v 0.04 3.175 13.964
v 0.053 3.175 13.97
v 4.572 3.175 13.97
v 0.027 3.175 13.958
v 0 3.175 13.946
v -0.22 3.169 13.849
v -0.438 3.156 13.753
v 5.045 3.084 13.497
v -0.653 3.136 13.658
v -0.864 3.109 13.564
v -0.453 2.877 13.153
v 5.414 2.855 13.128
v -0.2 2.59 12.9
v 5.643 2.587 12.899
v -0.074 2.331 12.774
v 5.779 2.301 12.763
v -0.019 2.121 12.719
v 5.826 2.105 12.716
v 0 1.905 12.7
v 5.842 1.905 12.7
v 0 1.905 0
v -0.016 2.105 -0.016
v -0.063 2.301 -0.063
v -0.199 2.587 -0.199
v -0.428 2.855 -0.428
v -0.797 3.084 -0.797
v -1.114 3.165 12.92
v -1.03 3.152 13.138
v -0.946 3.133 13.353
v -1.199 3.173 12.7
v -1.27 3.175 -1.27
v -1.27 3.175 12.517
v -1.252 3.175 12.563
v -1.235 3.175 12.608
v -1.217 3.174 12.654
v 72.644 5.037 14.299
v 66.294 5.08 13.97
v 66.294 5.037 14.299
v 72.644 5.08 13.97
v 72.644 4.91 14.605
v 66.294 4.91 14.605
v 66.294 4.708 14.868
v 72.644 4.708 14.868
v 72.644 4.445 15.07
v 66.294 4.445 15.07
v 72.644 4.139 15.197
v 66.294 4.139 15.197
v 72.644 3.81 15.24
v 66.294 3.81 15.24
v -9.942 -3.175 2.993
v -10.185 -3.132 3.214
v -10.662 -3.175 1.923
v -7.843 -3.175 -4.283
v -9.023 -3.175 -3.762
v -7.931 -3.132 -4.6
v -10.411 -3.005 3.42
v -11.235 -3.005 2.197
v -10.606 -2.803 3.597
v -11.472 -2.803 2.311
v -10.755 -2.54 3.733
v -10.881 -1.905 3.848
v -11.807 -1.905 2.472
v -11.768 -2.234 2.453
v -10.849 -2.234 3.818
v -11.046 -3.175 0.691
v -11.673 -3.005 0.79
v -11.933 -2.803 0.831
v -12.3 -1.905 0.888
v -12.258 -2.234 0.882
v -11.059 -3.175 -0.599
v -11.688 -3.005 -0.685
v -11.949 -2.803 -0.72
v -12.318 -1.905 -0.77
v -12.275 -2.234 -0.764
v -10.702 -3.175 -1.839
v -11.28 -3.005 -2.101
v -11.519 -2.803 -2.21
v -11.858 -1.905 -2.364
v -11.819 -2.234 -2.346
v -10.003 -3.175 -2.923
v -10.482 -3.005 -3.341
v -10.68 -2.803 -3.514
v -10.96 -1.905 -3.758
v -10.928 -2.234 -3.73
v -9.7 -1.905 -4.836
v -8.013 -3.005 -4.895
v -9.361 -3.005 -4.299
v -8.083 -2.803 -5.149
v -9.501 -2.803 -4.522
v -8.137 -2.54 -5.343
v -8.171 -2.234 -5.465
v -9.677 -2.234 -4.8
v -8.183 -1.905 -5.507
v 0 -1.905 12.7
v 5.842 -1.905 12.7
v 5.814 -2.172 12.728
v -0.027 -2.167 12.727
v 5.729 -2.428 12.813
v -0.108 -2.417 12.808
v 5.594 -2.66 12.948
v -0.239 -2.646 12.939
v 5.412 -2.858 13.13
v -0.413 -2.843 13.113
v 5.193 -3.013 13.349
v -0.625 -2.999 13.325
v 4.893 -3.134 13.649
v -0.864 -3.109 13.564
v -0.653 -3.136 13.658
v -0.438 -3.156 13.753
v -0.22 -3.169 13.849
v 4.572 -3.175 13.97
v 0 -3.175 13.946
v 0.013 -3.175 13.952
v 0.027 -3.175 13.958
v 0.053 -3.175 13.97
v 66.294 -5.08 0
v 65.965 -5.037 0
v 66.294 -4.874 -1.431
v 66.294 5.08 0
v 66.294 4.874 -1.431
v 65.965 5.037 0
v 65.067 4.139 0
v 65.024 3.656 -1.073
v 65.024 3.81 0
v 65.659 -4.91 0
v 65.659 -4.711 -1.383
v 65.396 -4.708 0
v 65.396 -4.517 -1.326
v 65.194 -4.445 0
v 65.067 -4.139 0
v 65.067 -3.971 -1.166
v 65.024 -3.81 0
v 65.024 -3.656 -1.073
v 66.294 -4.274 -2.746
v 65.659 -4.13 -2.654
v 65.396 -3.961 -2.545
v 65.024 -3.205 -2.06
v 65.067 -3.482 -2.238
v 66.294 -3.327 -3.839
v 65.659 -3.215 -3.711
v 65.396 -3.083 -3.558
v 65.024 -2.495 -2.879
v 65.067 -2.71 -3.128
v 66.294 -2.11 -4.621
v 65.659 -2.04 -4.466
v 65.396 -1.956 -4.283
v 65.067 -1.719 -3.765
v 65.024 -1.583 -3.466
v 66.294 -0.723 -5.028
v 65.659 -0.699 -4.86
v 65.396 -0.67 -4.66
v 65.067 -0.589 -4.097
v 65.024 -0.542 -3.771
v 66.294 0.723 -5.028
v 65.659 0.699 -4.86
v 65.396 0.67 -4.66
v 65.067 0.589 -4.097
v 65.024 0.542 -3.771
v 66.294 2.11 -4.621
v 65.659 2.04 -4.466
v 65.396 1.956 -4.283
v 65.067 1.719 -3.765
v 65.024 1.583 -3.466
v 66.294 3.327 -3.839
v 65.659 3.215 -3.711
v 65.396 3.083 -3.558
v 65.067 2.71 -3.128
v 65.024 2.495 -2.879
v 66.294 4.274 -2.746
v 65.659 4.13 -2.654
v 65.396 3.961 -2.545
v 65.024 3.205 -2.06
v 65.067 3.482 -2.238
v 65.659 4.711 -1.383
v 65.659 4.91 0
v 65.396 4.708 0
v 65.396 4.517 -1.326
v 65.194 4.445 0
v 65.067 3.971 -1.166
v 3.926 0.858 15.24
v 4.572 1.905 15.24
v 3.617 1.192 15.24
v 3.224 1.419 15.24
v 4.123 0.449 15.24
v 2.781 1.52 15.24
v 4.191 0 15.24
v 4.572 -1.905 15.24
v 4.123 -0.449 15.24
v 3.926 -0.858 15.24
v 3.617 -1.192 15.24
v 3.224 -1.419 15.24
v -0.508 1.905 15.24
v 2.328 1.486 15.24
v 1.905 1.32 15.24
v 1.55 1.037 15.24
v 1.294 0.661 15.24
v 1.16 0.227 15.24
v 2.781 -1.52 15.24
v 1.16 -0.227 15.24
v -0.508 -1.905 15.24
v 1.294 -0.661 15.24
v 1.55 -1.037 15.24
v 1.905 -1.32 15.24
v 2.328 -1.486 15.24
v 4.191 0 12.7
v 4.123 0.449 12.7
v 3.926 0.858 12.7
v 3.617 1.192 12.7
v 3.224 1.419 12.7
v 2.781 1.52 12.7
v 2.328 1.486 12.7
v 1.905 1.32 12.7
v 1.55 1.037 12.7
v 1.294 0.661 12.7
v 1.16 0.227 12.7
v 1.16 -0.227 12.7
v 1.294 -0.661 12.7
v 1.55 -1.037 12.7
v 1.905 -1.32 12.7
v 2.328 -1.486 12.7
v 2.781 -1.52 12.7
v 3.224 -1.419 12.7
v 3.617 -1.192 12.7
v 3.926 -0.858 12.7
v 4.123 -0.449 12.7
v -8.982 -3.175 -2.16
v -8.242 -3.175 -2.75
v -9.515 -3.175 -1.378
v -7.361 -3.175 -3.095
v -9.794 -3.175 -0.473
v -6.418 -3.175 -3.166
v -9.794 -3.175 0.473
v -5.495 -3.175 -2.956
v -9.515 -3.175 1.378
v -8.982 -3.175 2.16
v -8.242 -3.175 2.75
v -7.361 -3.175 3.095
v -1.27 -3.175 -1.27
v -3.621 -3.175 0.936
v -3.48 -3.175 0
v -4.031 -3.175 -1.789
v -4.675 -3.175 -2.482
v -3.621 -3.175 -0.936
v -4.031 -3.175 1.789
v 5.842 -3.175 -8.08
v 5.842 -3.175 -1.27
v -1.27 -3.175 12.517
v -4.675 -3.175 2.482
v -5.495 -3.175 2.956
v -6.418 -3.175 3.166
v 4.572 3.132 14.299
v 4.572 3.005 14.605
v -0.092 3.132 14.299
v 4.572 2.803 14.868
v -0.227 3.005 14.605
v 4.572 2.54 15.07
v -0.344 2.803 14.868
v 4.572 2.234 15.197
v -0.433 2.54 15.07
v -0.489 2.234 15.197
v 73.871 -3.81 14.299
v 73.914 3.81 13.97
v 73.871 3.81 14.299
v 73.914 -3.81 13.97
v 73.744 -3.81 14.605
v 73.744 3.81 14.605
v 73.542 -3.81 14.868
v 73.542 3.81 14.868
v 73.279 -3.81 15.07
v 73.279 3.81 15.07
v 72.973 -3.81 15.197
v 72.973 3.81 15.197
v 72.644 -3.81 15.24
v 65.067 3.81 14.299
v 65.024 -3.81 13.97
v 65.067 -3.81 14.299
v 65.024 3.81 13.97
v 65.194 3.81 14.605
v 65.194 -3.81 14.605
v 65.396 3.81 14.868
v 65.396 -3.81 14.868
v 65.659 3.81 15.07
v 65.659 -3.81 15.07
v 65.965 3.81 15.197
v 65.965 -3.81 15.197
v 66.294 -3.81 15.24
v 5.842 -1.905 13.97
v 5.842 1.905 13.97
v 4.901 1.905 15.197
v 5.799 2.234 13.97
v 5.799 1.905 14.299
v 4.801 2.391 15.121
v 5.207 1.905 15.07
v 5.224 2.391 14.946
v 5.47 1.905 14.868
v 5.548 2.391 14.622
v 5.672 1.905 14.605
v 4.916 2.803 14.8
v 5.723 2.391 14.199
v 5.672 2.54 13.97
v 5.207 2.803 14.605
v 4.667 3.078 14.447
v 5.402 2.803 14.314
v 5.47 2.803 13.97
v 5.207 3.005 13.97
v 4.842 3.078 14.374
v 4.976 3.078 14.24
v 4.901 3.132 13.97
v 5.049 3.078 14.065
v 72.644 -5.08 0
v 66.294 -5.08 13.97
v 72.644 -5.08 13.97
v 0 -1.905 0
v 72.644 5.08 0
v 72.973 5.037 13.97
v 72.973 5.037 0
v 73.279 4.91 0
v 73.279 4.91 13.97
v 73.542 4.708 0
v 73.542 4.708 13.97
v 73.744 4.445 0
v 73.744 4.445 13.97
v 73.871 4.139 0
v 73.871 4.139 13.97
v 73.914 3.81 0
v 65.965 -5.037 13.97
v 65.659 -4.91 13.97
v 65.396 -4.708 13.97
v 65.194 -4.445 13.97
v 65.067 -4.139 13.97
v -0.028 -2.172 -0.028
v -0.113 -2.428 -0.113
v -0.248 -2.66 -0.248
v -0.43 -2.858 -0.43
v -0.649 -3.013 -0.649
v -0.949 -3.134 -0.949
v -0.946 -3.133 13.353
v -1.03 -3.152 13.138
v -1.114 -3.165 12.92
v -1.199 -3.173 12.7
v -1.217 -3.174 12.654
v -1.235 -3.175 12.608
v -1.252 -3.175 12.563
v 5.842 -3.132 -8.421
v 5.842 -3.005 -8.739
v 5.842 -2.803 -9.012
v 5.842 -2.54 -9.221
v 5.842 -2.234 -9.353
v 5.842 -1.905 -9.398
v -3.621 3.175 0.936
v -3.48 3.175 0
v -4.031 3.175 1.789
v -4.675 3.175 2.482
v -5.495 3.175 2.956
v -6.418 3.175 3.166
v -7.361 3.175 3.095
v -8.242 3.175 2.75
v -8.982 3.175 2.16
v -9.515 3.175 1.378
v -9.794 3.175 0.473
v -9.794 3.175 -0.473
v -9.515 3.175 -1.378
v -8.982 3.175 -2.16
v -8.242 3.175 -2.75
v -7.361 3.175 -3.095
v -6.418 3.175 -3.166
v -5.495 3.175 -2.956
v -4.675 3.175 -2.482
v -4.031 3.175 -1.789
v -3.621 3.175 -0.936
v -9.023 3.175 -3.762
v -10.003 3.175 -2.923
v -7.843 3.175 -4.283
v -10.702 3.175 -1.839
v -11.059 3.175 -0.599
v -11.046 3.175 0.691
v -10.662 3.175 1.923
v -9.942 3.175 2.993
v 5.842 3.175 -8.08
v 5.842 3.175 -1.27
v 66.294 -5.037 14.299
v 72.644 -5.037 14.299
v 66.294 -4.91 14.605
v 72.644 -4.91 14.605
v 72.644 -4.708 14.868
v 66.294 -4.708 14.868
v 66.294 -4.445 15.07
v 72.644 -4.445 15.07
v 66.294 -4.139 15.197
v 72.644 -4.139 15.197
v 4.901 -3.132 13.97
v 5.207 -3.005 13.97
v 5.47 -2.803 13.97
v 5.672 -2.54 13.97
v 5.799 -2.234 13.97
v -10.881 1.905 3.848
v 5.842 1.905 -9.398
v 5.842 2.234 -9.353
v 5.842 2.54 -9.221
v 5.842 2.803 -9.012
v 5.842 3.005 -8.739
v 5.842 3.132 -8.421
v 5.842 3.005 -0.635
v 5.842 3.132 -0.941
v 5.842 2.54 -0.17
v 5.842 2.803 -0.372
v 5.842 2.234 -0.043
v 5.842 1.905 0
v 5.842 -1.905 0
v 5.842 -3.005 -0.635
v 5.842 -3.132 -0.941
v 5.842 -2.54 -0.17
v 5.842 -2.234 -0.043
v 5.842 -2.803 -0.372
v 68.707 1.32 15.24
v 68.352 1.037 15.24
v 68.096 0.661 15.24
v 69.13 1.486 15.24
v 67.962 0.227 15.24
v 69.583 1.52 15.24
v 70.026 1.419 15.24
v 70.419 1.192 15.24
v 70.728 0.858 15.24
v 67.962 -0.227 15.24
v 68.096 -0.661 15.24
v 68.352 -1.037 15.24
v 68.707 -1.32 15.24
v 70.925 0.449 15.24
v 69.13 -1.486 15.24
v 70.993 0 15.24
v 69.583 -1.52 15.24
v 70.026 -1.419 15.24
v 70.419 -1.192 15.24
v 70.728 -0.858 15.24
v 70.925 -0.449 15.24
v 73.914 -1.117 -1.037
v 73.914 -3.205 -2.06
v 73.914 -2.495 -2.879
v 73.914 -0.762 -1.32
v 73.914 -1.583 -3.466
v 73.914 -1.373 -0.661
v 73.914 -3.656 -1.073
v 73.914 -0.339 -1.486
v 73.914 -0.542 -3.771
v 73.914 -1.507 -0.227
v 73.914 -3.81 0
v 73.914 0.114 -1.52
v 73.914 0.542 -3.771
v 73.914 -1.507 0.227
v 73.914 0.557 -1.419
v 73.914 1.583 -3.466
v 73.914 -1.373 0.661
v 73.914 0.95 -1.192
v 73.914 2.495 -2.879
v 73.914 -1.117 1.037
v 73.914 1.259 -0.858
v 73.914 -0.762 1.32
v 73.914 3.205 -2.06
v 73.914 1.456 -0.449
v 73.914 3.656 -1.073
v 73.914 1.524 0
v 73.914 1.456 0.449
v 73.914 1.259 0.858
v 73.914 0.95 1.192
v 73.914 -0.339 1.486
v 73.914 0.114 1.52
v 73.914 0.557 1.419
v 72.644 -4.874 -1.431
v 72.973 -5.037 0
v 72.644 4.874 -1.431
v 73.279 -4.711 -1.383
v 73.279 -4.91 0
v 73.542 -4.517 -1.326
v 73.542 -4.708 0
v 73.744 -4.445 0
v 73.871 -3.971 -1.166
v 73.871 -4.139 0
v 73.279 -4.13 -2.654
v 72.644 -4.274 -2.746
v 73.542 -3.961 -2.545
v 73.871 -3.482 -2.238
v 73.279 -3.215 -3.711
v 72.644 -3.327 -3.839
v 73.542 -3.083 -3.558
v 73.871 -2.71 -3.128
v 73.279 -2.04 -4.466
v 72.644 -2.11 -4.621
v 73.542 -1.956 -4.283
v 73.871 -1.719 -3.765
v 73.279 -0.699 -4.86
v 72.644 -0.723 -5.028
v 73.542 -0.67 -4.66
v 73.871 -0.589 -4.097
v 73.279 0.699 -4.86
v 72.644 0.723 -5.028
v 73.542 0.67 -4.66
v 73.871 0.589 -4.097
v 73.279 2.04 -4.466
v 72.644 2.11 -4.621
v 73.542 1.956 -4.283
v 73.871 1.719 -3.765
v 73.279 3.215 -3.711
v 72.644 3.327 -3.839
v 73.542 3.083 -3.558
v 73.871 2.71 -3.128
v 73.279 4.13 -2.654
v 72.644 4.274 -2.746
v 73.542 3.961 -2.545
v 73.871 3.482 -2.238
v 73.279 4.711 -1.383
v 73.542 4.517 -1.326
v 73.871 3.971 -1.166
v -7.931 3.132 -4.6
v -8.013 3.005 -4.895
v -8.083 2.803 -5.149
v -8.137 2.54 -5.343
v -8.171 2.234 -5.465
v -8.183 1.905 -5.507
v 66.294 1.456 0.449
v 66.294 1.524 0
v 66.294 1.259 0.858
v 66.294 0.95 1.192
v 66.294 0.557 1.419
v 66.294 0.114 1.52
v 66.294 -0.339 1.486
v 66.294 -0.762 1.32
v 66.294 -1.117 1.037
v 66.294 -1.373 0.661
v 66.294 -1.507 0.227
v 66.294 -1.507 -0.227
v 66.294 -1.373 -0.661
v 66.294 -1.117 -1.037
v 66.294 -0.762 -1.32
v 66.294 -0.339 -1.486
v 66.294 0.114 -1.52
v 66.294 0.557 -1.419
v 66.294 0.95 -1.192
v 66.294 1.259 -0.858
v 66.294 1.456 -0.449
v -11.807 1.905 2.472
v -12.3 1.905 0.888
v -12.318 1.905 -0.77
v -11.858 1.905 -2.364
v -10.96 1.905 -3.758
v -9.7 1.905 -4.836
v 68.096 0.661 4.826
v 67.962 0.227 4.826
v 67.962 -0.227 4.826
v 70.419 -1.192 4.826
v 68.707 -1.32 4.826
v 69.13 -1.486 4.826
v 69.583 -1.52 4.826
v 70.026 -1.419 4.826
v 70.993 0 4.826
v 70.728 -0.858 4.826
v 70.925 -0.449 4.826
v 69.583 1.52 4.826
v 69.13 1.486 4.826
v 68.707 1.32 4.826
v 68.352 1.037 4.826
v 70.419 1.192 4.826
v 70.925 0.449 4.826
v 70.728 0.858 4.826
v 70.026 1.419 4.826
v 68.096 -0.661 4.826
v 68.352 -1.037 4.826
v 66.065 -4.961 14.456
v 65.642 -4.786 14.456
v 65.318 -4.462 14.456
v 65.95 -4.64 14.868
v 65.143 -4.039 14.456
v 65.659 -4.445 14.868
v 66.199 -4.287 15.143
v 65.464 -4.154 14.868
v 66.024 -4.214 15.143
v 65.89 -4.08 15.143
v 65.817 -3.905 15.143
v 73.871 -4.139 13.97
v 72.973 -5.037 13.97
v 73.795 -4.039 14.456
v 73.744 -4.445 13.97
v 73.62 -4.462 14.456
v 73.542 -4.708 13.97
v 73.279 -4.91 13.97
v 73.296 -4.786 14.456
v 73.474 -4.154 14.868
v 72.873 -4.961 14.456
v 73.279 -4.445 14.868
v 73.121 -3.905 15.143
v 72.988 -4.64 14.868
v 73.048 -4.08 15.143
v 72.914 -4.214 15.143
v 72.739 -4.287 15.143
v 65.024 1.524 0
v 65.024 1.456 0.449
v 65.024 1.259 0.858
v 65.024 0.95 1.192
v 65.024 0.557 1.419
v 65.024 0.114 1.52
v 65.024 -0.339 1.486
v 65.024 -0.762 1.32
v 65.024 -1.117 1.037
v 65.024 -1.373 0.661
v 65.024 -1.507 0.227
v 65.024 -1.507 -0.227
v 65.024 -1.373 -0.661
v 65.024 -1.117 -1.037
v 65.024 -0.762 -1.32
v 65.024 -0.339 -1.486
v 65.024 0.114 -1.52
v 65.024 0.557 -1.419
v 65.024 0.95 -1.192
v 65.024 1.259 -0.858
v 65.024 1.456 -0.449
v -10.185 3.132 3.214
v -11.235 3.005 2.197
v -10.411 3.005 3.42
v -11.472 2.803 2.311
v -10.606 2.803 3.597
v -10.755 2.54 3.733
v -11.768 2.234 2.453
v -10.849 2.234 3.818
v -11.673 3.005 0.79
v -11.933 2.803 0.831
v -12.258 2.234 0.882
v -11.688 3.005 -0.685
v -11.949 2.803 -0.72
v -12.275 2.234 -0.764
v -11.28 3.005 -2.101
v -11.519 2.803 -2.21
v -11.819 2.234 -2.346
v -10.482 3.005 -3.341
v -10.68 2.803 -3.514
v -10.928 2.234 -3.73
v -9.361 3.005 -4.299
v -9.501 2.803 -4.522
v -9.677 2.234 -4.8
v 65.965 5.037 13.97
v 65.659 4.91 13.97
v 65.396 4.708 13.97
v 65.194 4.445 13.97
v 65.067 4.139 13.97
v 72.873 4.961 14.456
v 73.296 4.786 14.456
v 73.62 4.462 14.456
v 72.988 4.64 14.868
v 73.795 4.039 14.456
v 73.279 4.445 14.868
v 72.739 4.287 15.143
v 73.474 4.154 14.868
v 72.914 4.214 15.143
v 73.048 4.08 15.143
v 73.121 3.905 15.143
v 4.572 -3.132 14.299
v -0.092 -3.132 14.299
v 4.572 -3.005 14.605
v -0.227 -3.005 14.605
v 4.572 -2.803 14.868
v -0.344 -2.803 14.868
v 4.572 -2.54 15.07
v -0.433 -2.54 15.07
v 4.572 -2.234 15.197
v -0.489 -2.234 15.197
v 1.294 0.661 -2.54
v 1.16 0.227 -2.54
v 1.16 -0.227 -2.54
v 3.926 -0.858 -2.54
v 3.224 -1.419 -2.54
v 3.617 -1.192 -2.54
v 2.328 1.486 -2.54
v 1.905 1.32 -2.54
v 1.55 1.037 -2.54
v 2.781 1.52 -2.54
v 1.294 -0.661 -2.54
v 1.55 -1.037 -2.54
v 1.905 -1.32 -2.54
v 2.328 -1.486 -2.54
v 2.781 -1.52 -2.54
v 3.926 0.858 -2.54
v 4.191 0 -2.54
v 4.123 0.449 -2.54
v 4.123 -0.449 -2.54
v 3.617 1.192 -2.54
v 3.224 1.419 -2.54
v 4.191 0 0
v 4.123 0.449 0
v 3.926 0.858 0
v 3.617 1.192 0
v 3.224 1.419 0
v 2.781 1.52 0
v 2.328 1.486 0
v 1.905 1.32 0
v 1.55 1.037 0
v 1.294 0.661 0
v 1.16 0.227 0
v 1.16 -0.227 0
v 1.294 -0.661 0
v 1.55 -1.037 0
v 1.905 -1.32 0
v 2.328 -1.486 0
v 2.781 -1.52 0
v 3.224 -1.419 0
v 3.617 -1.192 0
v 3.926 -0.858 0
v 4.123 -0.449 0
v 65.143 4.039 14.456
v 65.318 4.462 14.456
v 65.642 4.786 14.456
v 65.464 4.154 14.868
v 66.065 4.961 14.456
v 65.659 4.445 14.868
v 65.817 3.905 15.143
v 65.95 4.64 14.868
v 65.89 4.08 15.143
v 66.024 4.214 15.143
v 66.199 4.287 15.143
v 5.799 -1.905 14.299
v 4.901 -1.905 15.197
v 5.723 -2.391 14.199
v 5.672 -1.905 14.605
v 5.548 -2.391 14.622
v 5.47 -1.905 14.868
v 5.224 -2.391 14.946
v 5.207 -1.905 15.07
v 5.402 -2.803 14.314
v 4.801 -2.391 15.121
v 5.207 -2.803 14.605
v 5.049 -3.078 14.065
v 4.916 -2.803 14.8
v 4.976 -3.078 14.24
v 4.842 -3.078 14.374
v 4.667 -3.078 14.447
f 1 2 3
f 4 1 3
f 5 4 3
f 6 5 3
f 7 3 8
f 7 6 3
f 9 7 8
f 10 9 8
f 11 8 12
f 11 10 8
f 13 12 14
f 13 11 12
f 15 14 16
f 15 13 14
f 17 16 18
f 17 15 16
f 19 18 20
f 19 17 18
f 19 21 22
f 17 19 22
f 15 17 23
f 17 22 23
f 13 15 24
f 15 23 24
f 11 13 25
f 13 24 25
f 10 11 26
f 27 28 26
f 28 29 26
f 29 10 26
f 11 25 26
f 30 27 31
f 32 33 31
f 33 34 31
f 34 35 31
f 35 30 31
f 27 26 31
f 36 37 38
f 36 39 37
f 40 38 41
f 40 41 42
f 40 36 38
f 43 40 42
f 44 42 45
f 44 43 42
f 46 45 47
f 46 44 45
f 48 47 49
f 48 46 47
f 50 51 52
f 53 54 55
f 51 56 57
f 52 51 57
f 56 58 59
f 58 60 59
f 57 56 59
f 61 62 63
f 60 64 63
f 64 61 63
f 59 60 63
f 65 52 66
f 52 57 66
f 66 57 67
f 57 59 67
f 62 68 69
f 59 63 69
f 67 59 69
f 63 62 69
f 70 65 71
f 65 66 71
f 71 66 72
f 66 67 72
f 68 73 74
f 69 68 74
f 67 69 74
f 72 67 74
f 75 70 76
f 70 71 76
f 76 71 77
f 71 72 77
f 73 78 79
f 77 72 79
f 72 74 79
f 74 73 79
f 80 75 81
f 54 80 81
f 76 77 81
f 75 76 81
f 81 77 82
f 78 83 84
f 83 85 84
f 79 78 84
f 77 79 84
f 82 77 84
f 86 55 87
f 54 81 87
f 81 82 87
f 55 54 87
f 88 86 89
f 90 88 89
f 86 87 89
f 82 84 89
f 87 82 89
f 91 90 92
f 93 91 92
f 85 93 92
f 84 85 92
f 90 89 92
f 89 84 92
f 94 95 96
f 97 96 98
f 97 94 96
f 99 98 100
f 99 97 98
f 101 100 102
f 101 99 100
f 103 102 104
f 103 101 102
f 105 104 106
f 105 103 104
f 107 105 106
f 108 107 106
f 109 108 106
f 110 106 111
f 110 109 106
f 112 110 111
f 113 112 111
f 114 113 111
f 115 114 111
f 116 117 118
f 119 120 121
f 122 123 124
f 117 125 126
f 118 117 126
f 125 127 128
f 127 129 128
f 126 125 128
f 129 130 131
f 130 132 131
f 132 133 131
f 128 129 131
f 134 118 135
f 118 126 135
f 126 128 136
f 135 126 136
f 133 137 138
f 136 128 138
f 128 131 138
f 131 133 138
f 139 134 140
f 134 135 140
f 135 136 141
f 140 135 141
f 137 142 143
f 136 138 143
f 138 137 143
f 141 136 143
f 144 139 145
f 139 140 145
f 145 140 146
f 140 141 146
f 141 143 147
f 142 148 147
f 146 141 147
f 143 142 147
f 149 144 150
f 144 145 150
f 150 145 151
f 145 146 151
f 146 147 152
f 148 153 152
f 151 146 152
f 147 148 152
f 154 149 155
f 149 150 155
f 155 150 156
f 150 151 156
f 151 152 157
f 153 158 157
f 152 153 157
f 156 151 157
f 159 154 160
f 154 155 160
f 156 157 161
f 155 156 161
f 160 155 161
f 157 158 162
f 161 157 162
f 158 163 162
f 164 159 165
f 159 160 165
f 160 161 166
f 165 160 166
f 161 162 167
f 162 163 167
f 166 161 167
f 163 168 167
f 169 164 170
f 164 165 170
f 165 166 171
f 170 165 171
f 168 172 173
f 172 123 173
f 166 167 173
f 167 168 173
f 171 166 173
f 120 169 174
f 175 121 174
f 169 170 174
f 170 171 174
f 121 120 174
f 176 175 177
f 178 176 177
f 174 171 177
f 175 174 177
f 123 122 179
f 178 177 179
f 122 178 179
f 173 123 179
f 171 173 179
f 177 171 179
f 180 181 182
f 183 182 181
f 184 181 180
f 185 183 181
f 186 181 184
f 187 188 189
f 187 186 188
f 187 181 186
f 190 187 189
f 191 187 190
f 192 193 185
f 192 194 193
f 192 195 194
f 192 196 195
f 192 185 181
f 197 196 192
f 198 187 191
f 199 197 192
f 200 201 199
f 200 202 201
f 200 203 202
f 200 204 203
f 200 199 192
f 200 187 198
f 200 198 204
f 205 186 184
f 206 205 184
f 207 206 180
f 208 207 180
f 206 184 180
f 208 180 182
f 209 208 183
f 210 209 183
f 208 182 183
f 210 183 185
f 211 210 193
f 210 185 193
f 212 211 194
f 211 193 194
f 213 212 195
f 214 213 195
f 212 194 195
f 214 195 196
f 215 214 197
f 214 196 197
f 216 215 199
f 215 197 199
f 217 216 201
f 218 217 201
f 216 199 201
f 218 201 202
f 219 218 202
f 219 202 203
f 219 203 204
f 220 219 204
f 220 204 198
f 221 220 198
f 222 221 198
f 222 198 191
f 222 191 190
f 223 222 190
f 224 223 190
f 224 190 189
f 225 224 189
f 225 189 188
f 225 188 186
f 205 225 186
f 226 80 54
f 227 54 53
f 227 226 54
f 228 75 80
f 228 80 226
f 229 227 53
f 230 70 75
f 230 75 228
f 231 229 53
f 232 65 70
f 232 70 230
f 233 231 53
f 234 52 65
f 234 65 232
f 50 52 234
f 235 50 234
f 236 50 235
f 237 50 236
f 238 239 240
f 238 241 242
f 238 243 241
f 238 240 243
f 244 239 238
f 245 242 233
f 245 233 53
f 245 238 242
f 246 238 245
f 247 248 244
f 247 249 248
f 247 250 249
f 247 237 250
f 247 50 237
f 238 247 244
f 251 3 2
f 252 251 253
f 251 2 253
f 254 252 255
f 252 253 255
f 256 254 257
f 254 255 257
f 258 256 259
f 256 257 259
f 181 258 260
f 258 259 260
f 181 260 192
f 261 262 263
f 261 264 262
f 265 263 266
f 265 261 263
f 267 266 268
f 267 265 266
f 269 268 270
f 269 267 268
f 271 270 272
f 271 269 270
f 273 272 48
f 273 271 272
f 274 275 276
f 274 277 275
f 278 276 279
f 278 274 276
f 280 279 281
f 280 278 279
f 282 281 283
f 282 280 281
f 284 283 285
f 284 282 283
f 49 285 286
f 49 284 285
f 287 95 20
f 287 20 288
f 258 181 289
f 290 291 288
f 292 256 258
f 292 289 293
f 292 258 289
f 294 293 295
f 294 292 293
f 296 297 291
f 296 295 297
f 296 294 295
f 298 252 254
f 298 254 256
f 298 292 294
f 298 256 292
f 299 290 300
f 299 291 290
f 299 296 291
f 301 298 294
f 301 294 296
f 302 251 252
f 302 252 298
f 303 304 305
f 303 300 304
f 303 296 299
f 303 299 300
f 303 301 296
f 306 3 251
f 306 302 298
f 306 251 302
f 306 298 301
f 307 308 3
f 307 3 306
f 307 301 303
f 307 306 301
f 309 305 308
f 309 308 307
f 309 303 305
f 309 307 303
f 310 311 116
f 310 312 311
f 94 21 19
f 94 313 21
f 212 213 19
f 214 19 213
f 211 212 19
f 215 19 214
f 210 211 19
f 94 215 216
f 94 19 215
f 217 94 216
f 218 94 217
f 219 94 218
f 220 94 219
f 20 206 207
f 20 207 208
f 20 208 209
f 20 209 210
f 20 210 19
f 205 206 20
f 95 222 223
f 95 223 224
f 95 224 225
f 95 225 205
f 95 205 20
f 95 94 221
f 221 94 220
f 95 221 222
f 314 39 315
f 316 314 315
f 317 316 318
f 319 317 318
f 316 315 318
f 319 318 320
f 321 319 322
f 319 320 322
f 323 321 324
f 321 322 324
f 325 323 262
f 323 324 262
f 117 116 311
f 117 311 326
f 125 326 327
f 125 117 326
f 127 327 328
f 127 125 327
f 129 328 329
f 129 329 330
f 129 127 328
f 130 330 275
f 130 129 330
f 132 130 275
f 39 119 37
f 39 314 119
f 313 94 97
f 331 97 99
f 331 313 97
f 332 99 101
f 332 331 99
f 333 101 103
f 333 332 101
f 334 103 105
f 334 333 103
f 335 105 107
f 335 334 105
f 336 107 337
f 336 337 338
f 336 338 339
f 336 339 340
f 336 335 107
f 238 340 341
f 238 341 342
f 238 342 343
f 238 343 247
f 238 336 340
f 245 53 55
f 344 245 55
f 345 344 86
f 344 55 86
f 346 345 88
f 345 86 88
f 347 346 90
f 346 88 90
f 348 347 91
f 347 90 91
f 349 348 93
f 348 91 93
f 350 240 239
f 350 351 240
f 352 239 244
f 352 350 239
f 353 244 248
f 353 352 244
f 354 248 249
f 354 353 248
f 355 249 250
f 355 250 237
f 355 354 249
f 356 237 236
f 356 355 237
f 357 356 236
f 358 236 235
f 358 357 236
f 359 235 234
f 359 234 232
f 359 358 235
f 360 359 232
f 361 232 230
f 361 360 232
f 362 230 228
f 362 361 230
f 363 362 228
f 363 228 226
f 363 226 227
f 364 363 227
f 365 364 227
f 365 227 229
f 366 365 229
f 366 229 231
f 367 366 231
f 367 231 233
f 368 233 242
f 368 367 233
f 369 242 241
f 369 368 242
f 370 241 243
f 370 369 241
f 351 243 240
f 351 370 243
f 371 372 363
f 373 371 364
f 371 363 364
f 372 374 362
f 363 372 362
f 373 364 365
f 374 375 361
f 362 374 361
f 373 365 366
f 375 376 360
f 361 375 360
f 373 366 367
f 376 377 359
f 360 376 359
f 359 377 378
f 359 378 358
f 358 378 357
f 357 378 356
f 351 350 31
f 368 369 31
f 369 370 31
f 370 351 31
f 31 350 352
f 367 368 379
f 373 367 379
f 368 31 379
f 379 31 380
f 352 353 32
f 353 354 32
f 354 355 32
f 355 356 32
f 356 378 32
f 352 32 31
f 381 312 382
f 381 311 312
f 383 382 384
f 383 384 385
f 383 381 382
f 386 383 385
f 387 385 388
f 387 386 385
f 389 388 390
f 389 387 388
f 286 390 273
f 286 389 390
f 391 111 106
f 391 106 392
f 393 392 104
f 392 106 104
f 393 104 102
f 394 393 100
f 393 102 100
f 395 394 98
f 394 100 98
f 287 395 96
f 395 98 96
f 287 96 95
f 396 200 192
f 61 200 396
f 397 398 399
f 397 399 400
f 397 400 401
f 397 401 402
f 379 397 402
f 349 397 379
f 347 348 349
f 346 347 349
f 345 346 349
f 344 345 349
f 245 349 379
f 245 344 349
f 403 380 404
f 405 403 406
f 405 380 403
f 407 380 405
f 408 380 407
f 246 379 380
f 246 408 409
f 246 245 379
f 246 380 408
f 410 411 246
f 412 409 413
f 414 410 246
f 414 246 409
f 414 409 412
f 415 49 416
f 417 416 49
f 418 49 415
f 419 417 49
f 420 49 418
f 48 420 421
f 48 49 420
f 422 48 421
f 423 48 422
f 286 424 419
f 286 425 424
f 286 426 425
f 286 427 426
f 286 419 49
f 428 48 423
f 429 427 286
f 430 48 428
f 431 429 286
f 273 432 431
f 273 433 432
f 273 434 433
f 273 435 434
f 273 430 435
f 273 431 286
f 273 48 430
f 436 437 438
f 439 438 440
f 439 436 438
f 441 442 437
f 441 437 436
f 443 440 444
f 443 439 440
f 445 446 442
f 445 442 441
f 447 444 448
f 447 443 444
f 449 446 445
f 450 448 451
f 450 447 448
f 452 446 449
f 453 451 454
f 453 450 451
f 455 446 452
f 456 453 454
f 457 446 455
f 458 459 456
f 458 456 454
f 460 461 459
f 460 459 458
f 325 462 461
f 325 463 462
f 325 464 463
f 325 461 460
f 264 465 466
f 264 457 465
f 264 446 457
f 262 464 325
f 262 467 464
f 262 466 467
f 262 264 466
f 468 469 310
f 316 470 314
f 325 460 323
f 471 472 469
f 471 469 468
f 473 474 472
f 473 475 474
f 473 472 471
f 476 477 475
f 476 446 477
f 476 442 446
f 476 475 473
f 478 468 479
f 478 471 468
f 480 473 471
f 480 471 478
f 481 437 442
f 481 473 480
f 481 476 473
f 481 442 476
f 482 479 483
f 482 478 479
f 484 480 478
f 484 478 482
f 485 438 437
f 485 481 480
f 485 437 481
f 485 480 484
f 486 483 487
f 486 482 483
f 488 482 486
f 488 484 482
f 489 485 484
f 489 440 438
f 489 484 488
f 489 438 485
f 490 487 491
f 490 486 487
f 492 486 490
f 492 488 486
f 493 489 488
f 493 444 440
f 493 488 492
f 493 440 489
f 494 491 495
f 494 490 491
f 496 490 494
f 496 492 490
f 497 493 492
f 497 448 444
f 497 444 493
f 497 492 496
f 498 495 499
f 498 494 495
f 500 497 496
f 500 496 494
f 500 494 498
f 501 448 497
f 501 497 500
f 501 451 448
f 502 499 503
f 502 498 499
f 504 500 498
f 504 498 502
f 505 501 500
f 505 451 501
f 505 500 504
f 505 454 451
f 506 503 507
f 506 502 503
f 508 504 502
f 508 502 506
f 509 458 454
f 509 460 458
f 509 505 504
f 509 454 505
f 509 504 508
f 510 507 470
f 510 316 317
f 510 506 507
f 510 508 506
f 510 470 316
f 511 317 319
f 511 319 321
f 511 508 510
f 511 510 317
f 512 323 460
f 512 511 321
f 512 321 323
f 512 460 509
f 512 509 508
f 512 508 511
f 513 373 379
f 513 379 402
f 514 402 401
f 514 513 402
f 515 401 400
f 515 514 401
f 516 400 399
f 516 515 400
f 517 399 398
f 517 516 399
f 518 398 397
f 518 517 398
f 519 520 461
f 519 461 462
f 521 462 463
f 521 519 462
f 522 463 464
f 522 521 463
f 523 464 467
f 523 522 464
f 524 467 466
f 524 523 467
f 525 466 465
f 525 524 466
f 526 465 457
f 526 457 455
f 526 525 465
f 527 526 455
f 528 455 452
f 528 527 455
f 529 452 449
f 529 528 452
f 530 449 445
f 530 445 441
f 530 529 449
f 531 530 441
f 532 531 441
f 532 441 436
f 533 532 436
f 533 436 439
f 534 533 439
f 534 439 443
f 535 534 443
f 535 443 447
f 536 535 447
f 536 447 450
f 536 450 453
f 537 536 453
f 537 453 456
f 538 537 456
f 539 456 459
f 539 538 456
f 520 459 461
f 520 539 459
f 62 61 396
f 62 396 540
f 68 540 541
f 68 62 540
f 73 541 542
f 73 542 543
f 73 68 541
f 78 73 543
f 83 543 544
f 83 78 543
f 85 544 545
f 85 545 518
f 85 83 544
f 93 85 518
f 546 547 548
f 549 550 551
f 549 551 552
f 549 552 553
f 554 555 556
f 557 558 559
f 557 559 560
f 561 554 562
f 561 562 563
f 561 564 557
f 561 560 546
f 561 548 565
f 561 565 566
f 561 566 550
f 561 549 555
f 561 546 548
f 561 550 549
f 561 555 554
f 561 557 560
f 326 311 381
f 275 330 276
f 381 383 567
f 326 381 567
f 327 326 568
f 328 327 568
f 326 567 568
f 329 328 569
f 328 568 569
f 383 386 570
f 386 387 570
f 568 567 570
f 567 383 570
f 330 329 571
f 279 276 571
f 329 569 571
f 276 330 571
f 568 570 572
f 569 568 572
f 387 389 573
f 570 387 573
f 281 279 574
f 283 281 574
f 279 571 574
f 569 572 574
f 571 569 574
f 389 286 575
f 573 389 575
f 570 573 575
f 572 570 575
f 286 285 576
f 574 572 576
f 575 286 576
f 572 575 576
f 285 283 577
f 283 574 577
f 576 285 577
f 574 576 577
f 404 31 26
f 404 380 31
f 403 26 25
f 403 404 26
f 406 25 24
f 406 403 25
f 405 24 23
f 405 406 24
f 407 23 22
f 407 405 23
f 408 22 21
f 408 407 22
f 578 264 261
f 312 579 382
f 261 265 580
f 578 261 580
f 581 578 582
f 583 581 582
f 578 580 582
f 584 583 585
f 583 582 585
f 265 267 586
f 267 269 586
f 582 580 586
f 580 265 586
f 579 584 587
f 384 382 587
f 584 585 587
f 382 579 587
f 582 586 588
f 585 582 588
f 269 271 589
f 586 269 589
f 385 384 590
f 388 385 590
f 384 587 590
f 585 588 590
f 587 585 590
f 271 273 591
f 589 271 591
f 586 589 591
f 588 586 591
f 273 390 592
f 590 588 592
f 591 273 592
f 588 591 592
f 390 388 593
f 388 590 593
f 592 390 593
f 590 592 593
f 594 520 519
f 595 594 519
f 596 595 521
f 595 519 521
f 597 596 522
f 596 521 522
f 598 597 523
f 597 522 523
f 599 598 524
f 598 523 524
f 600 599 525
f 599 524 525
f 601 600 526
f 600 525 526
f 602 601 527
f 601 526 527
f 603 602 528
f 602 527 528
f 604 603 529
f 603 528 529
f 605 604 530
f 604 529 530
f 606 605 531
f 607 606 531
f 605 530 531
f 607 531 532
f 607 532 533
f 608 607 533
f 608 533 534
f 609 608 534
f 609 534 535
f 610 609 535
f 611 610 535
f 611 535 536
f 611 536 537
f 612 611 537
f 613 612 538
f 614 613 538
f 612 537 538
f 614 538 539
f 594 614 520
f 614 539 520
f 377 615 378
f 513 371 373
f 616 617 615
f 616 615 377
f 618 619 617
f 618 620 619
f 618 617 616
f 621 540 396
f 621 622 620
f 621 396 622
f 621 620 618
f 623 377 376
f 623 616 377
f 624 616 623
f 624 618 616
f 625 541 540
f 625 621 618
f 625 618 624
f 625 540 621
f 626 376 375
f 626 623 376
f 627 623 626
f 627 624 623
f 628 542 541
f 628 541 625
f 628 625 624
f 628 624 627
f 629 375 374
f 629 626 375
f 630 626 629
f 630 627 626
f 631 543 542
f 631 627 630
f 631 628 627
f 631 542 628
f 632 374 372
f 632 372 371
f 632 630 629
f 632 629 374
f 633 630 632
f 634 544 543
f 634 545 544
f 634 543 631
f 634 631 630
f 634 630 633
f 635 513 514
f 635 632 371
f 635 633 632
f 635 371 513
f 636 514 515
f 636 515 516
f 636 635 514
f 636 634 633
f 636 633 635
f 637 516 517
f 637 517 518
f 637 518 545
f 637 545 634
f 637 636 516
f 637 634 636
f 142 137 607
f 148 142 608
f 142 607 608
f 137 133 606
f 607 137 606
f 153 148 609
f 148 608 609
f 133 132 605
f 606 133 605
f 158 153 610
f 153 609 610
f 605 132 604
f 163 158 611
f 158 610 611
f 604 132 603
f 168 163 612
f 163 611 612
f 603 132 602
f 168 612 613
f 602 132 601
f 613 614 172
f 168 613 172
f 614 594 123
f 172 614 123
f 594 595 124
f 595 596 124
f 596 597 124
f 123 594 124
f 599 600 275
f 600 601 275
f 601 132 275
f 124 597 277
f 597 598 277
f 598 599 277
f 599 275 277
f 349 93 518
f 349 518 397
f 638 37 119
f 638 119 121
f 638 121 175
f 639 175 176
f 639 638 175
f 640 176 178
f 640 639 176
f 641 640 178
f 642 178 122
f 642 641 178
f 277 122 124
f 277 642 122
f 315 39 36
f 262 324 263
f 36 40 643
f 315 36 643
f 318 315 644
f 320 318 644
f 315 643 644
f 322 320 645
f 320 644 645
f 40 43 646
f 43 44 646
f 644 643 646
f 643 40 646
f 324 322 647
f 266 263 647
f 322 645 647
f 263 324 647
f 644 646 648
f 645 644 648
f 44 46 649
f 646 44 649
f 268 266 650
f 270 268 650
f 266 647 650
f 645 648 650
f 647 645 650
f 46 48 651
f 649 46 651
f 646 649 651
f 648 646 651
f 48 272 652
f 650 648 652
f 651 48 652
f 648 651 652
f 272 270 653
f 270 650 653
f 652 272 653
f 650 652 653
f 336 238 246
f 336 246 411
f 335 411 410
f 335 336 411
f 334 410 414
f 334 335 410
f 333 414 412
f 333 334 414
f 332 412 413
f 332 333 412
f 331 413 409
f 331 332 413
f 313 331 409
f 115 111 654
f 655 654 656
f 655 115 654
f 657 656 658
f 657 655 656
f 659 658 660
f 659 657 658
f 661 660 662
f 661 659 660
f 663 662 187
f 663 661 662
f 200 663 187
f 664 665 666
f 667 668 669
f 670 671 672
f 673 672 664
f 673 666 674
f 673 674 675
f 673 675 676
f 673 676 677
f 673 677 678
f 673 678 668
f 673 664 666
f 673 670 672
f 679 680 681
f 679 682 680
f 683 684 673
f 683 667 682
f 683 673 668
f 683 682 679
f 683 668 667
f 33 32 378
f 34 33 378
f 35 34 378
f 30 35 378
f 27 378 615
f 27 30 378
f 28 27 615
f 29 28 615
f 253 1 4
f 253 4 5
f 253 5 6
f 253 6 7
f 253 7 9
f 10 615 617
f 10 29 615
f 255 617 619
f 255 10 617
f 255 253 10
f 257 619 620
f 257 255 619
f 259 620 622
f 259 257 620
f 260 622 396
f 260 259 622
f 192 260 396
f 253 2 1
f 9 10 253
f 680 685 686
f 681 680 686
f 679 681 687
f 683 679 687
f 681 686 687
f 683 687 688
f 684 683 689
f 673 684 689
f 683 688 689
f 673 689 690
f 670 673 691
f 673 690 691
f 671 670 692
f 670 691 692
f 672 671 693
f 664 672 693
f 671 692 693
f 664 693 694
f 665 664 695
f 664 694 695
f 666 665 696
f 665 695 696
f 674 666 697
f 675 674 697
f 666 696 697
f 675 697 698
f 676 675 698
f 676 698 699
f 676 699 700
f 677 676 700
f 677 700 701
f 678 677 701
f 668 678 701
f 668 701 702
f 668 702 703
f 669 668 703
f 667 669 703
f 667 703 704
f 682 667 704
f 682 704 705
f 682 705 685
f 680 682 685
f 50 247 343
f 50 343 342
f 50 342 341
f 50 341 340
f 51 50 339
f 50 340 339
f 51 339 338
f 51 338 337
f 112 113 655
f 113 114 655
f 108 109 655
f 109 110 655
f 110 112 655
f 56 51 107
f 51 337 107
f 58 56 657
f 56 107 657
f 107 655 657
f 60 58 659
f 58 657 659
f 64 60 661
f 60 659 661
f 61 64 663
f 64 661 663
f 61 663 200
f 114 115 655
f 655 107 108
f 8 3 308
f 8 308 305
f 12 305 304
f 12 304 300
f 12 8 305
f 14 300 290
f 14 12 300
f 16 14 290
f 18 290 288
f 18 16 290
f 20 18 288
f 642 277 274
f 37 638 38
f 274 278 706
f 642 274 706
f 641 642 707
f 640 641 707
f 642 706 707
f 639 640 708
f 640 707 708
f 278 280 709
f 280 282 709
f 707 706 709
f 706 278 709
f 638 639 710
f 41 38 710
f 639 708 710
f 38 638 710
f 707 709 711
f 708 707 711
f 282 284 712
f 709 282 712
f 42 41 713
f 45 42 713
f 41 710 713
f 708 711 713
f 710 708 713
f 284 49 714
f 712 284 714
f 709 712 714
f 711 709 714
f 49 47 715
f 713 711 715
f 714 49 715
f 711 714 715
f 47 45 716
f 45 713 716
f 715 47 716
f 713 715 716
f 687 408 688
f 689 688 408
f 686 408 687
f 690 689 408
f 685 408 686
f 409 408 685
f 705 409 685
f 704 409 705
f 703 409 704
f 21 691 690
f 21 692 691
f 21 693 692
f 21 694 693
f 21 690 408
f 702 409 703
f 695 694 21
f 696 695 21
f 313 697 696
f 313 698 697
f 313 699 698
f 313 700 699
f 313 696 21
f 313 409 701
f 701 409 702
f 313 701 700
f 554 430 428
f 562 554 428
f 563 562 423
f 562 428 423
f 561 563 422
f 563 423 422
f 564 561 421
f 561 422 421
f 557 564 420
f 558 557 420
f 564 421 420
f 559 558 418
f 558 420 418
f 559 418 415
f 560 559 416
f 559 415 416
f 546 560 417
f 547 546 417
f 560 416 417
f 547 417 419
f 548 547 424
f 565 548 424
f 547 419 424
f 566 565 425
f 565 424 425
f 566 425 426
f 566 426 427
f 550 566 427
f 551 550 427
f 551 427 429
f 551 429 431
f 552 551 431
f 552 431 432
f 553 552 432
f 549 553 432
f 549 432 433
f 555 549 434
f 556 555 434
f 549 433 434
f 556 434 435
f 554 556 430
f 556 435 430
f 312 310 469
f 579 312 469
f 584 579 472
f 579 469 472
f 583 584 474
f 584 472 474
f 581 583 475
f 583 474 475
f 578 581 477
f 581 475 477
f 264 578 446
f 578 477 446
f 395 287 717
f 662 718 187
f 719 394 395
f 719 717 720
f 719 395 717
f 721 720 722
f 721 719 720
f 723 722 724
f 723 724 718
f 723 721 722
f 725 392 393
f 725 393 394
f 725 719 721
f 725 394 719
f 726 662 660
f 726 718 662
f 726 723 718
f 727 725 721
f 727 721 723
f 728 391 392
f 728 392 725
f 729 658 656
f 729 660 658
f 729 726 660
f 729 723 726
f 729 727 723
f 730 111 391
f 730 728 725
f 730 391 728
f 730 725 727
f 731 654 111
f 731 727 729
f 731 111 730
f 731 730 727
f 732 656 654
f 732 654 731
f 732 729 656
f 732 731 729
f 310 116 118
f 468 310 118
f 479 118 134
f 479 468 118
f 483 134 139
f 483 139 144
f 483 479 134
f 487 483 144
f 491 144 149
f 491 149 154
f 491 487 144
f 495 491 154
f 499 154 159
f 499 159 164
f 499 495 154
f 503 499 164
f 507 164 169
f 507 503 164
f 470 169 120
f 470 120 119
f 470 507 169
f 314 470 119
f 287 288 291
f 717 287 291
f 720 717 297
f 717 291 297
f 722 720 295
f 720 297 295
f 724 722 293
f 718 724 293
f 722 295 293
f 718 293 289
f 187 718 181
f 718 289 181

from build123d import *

# Parameters (mm, degrees)
F0_R          = 3.175
F2_DEPTH      = 3.175
F3_R          = 1.524
F4_DEPTH      = 7.62
F4_DEPTH_BACK = 1.27
F5_DEPTH      = 56.134
F7_R          = 1.524
F8_DEPTH      = 17.78
F6_R          = 1.524
F9_DEPTH      = 10.414
F10_T1_DEPTH  = 18.5821257943
F10_T3_DEPTH  = 8.255
F10_T5_DEPTH  = 4.445
F10_T7_DEPTH  = 9.017
F10_T9_DEPTH  = 12.7
F10_T11_DEPTH = 17.7294216388
F10_T13_DEPTH = 3.81
F10_S17_W     = 1.27
F10_S17_H     = 1.27
F10_T18_DEPTH = 1.27
F10_S23_W     = 1.27
F10_S23_H     = 1.27
F10_T24_DEPTH = 1.27
F10_T28_ANGLE = 116.8111069241
F10_T30_ANGLE = 116.8111069241
F10_T35_DEPTH = 15.875
F10_T39_DEPTH = 12.192
F10_T46_DEPTH = 15.875
F10_T50_DEPTH = 12.192
F10_T57_DEPTH = 15.875
F10_T61_DEPTH = 12.192
F10_T68_DEPTH = 15.875
F10_T72_DEPTH = 12.192
F10_2_F1_R    = 1.27
F10_2_F2_R    = 1.27
F10_2_F3_R    = 1.27


# Not quite as in the source:
# - a fillet or chamfer that OpenCascade refuses, or shapes differently, is made with other operations: its cross-section is extruded or revolved along the edge and cut away or added
# - two fillets or chamfers of one size are made in one step
# - the program builds the solid bodies; features that only make, move or delete a surface that nothing else refers to are left out


with BuildPart() as f2:
    # F0 (on Front) → F2 (new body, symmetric)
    with BuildSketch(Plane.XZ):
        with BuildLine():
            Line((-0.9398, 0), (0, 0))
            Line((0, 0), (0, 12.7))
            Line((0, 12.7), (5.842, 12.7))
            Line((5.842, 12.7), (5.842, 15.24))
            Line((5.842, 15.24), (-0.508, 15.24))
            Line((-0.508, 15.24), (-10.8806298187, 3.8475430269))
            ThreePointArc((-10.8806298187, 3.8475430269), (-4.5919612295, 5.3297205562), (-0.9398, 0))
        make_face()
        with BuildLine():
            ThreePointArc((-8.1826630726, -5.5069827884), (-3.1957909266, -4.5493385486), (-0.9398, 0))
            ThreePointArc((-0.9398, 0), (-4.5919612295, 5.3297205562), (-10.8806298187, 3.8475430269))
            ThreePointArc((-10.8806298187, 3.8475430269), (-12.1459778134, -1.5837270034), (-8.1826630726, -5.5069827884))
        make_face()
        with Locations((-6.6548, 0)):
            Circle(F0_R, mode=Mode.SUBTRACT)
        with BuildLine():
            Line((5.842, 0), (0, 0))
            Line((0, 0), (-0.9398, 0))
            ThreePointArc((-0.9398, 0), (-3.1957909266, -4.5493385486), (-8.1826630726, -5.5069827884))
            Line((-8.1826630726, -5.5069827884), (5.842, -9.398))
            Line((5.842, -9.398), (5.842, 0))
        make_face()
    extrude(amount=F2_DEPTH, both=True)

    # F3 (on face) → F5 (cut)
    with BuildSketch(Plane.YZ.offset(66.294)):
        Circle(F3_R)
    extrude(amount=-F5_DEPTH, mode=Mode.SUBTRACT)

    # F7 (on face) → F8 (cut)
    with BuildSketch(Plane.XY.offset(15.24)):
        with Locations((2.667, 0)):
            Circle(F7_R)
    extrude(amount=-F8_DEPTH, mode=Mode.SUBTRACT)

    # F10: fillet of radius 1.27 on 17 edges, made by hand

    # F10_s2 → F10_t1 (cut)
    with BuildSketch(Plane(origin=(9.4938886236, 0, 10.4273187748), x_dir=(0, 1, 0), z_dir=(-0.6732358752, 0, -0.7394277898))):
        with BuildLine():
            ThreePointArc((-3.175, -9.3657440555), (-2.8030256121, -10.2637696676), (-1.905, -10.6357440555))
            Line((-1.905, -10.6357440555), (-3.175, -10.6357440555))
            Line((-3.175, -10.6357440555), (-3.175, -9.3657440555))
        make_face()
        with BuildLine():
            ThreePointArc((3.175, -9.3657440555), (2.8030256121, -10.2637696676), (1.905, -10.6357440555))
            Line((1.905, -10.6357440555), (3.175, -10.6357440555))
            Line((3.175, -10.6357440555), (3.175, -9.3657440555))
        make_face()
    extrude(amount=F10_T1_DEPTH, mode=Mode.SUBTRACT)

    # F10_s4 → F10_t3 (cut)
    with BuildSketch(Plane.YZ.offset(-3.683)):
        with BuildLine():
            ThreePointArc((-3.175, 13.97), (-2.8030256121, 14.8680256121), (-1.905, 15.24))
            Line((-1.905, 15.24), (-3.175, 15.24))
            Line((-3.175, 15.24), (-3.175, 13.97))
        make_face()
        with BuildLine():
            ThreePointArc((3.175, 13.97), (2.8030256121, 14.8680256121), (1.905, 15.24))
            Line((1.905, 15.24), (3.175, 15.24))
            Line((3.175, 15.24), (3.175, 13.97))
        make_face()
    extrude(amount=F10_T3_DEPTH, mode=Mode.SUBTRACT)

    # F10_s6 → F10_t5 (cut)
    with BuildSketch(Plane.XY.offset(9.525)):
        with BuildLine():
            ThreePointArc((4.572, -3.175), (5.4700256121, -2.8030256121), (5.842, -1.905))
            Line((5.842, -1.905), (5.842, -3.175))
            Line((5.842, -3.175), (4.572, -3.175))
        make_face()
        with BuildLine():
            ThreePointArc((4.572, 3.175), (5.4700256121, 2.8030256121), (5.842, 1.905))
            Line((5.842, 1.905), (5.842, 3.175))
            Line((5.842, 3.175), (4.572, 3.175))
        make_face()
    extrude(amount=F10_T5_DEPTH, mode=Mode.SUBTRACT)

    # F10_s8 → F10_t7 (cut)
    with BuildSketch(Plane.YZ):
        with BuildLine():
            ThreePointArc((-1.905, 12.7), (-2.8030256121, 13.0719743879), (-3.175, 13.97))
            Line((-3.175, 13.97), (-3.175, 12.7))
            Line((-3.175, 12.7), (-1.905, 12.7))
        make_face()
        with BuildLine():
            ThreePointArc((3.175, 13.97), (2.8030256121, 13.0719743879), (1.905, 12.7))
            Line((1.905, 12.7), (3.175, 12.7))
            Line((3.175, 12.7), (3.175, 13.97))
        make_face()
        with BuildLine():
            ThreePointArc((3.175, -1.27), (2.8030256121, -0.3719743879), (1.905, 0))
            Line((1.905, 0), (3.175, 0))
            Line((3.175, 0), (3.175, -1.27))
        make_face()
        with BuildLine():
            ThreePointArc((-3.175, -1.27), (-2.8030256121, -0.3719743879), (-1.905, 0))
            Line((-1.905, 0), (-3.175, 0))
            Line((-3.175, 0), (-3.175, -1.27))
        make_face()
    extrude(amount=F10_T7_DEPTH, mode=Mode.SUBTRACT)

    # F10_s10 → F10_t9 (cut)
    with BuildSketch(Plane.XY):
        with BuildLine():
            ThreePointArc((0, -1.905), (-0.3719743879, -2.8030256121), (-1.27, -3.175))
            Line((-1.27, -3.175), (0, -3.175))
            Line((0, -3.175), (0, -1.905))
        make_face()
        with BuildLine():
            ThreePointArc((0, 1.905), (-0.3719743879, 2.8030256121), (-1.27, 3.175))
            Line((-1.27, 3.175), (0, 3.175))
            Line((0, 3.175), (0, 1.905))
        make_face()
    extrude(amount=F10_T9_DEPTH, mode=Mode.SUBTRACT)

    # F10_s12 → F10_t11 (cut)
    with BuildSketch(Plane(origin=(-6.179167626, 0, 1.7143547379), x_dir=(0, 1, 0), z_dir=(0.9636015378, 0, -0.2673426199))):
        with BuildLine():
            ThreePointArc((-3.175, -6.2241116667), (-2.8030256121, -7.1221372788), (-1.905, -7.4941116667))
            Line((-1.905, -7.4941116667), (-3.175, -7.4941116667))
            Line((-3.175, -7.4941116667), (-3.175, -6.2241116667))
        make_face()
        with BuildLine():
            ThreePointArc((3.175, -6.2241116667), (2.8030256121, -7.1221372788), (1.905, -7.4941116667))
            Line((1.905, -7.4941116667), (3.175, -7.4941116667))
            Line((3.175, -7.4941116667), (3.175, -6.2241116667))
        make_face()
    extrude(amount=F10_T11_DEPTH, mode=Mode.SUBTRACT)

    # F10_s14 → F10_t13 (cut)
    with BuildSketch(Plane.XZ.offset(-1.905)):
        with BuildLine():
            ThreePointArc((5.842, 13.97), (5.4700256121, 14.8680256121), (4.572, 15.24))
            Line((4.572, 15.24), (5.842, 15.24))
            Line((5.842, 15.24), (5.842, 13.97))
        make_face()
    extrude(amount=F10_T13_DEPTH, mode=Mode.SUBTRACT)


with BuildPart() as f4:
    # F3 (on face) → F4 (new body, two sides)
    with BuildSketch(Plane.YZ.offset(66.294)) as f4_sk:
        with BuildLine():
            ThreePointArc((-5.08, 0), (0, -5.08), (5.08, 0))
            ThreePointArc((5.08, 0), (0, 5.08), (-5.08, 0))
        make_face()
        Circle(F3_R, mode=Mode.SUBTRACT)
        with BuildLine():
            ThreePointArc((-5.08, 0), (0, 5.08), (5.08, 0))
            Line((5.08, 0), (5.08, 15.24))
            Line((5.08, 15.24), (-5.08, 15.24))
            Line((-5.08, 15.24), (-5.08, 0))
        make_face()
    extrude(amount=F4_DEPTH)
    extrude(f4_sk.sketch, amount=-F4_DEPTH_BACK)

    # F6 (on face) → F9 (cut)
    with BuildSketch(Plane.XY.offset(15.24)):
        with Locations((69.469, 0)):
            Circle(F6_R)
    extrude(amount=-F9_DEPTH, mode=Mode.SUBTRACT)

    # F10#2: fillet of radius 1.27 on 10 edges, made by hand

    # F10_2_f1
    f10_2_f1_edges = [f4.edges().sort_by_distance(p)[0] for p in [
        (73.914, 0, -5.08),
        (73.914, -5.08, 7.62),
        (73.914, 5.08, 7.62),
    ]]
    fillet(f10_2_f1_edges, radius=F10_2_F1_R)

    # F10_2_f2
    f10_2_f2_edges = [f4.edges().sort_by_distance(p)[0] for p in [
        (65.024, 0, -5.08),
        (65.024, -5.08, 7.62),
        (65.024, 5.08, 7.62),
    ]]
    fillet(f10_2_f2_edges, radius=F10_2_F2_R)

    # F10_2_f3
    f10_2_f3_edges = [f4.edges().sort_by_distance(p)[0] for p in [
        (69.469, -5.08, 15.24),
    ]]
    fillet(f10_2_f3_edges, radius=F10_2_F3_R)


with BuildPart() as f10_tool16:
    # F10_s17 → F10_t18 (new body)
    with BuildSketch(Plane.XZ.offset(1.905)):
        with Locations((5.207, 14.605)):
            Rectangle(F10_S17_W, F10_S17_H)
    extrude(amount=F10_T18_DEPTH)

    # F10_s19 → F10_t20 (revolve, cut)
    with BuildSketch(Plane(origin=(4.572, -1.905, 13.97), x_dir=(-0.7071067812, 0, -0.7071067812), z_dir=(-0.7071067812, 0, 0.7071067812))):
        with BuildLine():
            ThreePointArc((0, -1.27), (1.27, 0), (0, 1.27))
            Line((0, 1.27), (0, -1.27))
        make_face()
    revolve(axis=Axis((4.572, -1.905, 13.97), (0, -1, 0)), mode=Mode.SUBTRACT)


with BuildPart() as f2_1:
    add(f2.part)

    # F10_t15: cut F10_tool16
    add(f10_tool16.part, mode=Mode.SUBTRACT)


with BuildPart() as f10_tool22:
    # F10_s23 → F10_t24 (new body)
    with BuildSketch(Plane.XZ.offset(-1.905)):
        with Locations((5.207, 14.605)):
            Rectangle(F10_S23_W, F10_S23_H)
    extrude(amount=-F10_T24_DEPTH)

    # F10_s25 → F10_t26 (revolve, cut)
    with BuildSketch(Plane(origin=(4.572, 1.905, 13.97), x_dir=(-0.7071067812, 0, -0.7071067812), z_dir=(0.7071067812, 0, -0.7071067812))):
        with BuildLine():
            ThreePointArc((0, -1.27), (1.27, 0), (0, 1.27))
            Line((0, 1.27), (0, -1.27))
        make_face()
    revolve(axis=Axis((4.572, 1.905, 13.97), (0, 1, 0)), mode=Mode.SUBTRACT)


with BuildPart() as f2_2:
    add(f2_1.part)

    # F10_t21: cut F10_tool22
    add(f10_tool22.part, mode=Mode.SUBTRACT)

    # F10_s27 → F10_t28 (revolve, cut)
    with BuildSketch(Plane(origin=(-3.0162650989, 0, -3.3128214309), x_dir=(0, 1, 0), z_dir=(0.6732358752, 0, 0.7394277898))):
        with BuildLine():
            ThreePointArc((-3.175, 9.3657440555), (-2.8030256121, 10.2637696676), (-1.905, 10.6357440555))
            Line((-1.905, 10.6357440555), (-3.175, 10.6357440555))
            Line((-3.175, 10.6357440555), (-3.175, 9.3657440555))
        make_face()
    revolve(axis=Axis((-6.6548, -3.175, 0), (0, -1, 0)), revolution_arc=F10_T28_ANGLE, mode=Mode.SUBTRACT)

    # F10_s29 → F10_t30 (revolve, cut)
    with BuildSketch(Plane(origin=(-3.0162650989, 0, -3.3128214309), x_dir=(0, 1, 0), z_dir=(0.6732358752, 0, 0.7394277898))):
        with BuildLine():
            ThreePointArc((3.175, 9.3657440555), (2.8030256121, 10.2637696676), (1.905, 10.6357440555))
            Line((1.905, 10.6357440555), (3.175, 10.6357440555))
            Line((3.175, 10.6357440555), (3.175, 9.3657440555))
        make_face()
    revolve(axis=Axis((-6.6548, 3.175, 0), (0, -1, 0)), revolution_arc=F10_T30_ANGLE, mode=Mode.SUBTRACT)


with BuildPart() as f10_tool33:
    # F10_s34 → F10_t35 (new body)
    with BuildSketch(Plane.XY):
        with BuildLine():
            ThreePointArc((0, -1.905), (-0.3719743879, -2.8030256121), (-1.27, -3.175))
            Line((-1.27, -3.175), (0, -3.175))
            Line((0, -3.175), (0, -1.905))
        make_face()
    extrude(amount=F10_T35_DEPTH)

    split(bisect_by=Plane.XY.offset(12.7), keep=Keep.TOP)


with BuildPart() as f10_tool37:
    # F10_s38 → F10_t39 (new body)
    with BuildSketch(Plane.YZ.offset(-3.175)):
        with BuildLine():
            ThreePointArc((-1.905, 12.7), (-2.8030256121, 13.0719743879), (-3.175, 13.97))
            Line((-3.175, 13.97), (-3.175, 12.7))
            Line((-3.175, 12.7), (-1.905, 12.7))
        make_face()
    extrude(amount=F10_T39_DEPTH)

    split(bisect_by=Plane.YZ, keep=Keep.BOTTOM)


with BuildPart() as f10_tool33_1:
    add(f10_tool33.part)

    # F10_t41: intersect F10_tool37
    add(f10_tool37.part, mode=Mode.INTERSECT)


with BuildPart() as f2_3:
    add(f2_2.part)

    # F10_t31: cut F10_tool33
    add(f10_tool33_1.part, mode=Mode.SUBTRACT)


with BuildPart() as f10_tool44:
    # F10_s45 → F10_t46 (new body)
    with BuildSketch(Plane.XY.offset(-3.175)):
        with BuildLine():
            ThreePointArc((0, -1.905), (-0.3719743879, -2.8030256121), (-1.27, -3.175))
            Line((-1.27, -3.175), (0, -3.175))
            Line((0, -3.175), (0, -1.905))
        make_face()
    extrude(amount=F10_T46_DEPTH)

    split(bisect_by=Plane.XY, keep=Keep.BOTTOM)


with BuildPart() as f10_tool48:
    # F10_s49 → F10_t50 (new body)
    with BuildSketch(Plane.YZ.offset(9.017)):
        with BuildLine():
            ThreePointArc((-3.175, -1.27), (-2.8030256121, -0.3719743879), (-1.905, 0))
            Line((-1.905, 0), (-3.175, 0))
            Line((-3.175, 0), (-3.175, -1.27))
        make_face()
    extrude(amount=-F10_T50_DEPTH)

    split(bisect_by=Plane.YZ, keep=Keep.BOTTOM)


with BuildPart() as f10_tool44_1:
    add(f10_tool44.part)

    # F10_t52: intersect F10_tool48
    add(f10_tool48.part, mode=Mode.INTERSECT)


with BuildPart() as f2_4:
    add(f2_3.part)

    # F10_t42: cut F10_tool44
    add(f10_tool44_1.part, mode=Mode.SUBTRACT)


with BuildPart() as f10_tool55:
    # F10_s56 → F10_t57 (new body)
    with BuildSketch(Plane.XY):
        with BuildLine():
            ThreePointArc((0, 1.905), (-0.3719743879, 2.8030256121), (-1.27, 3.175))
            Line((-1.27, 3.175), (0, 3.175))
            Line((0, 3.175), (0, 1.905))
        make_face()
    extrude(amount=F10_T57_DEPTH)

    split(bisect_by=Plane.XY.offset(12.7), keep=Keep.TOP)


with BuildPart() as f10_tool59:
    # F10_s60 → F10_t61 (new body)
    with BuildSketch(Plane.YZ.offset(-3.175)):
        with BuildLine():
            ThreePointArc((3.175, 13.97), (2.8030256121, 13.0719743879), (1.905, 12.7))
            Line((1.905, 12.7), (3.175, 12.7))
            Line((3.175, 12.7), (3.175, 13.97))
        make_face()
    extrude(amount=F10_T61_DEPTH)

    split(bisect_by=Plane.YZ, keep=Keep.BOTTOM)


with BuildPart() as f10_tool55_1:
    add(f10_tool55.part)

    # F10_t63: intersect F10_tool59
    add(f10_tool59.part, mode=Mode.INTERSECT)


with BuildPart() as f2_5:
    add(f2_4.part)

    # F10_t53: cut F10_tool55
    add(f10_tool55_1.part, mode=Mode.SUBTRACT)


with BuildPart() as f10_tool66:
    # F10_s67 → F10_t68 (new body)
    with BuildSketch(Plane.XY.offset(-3.175)):
        with BuildLine():
            ThreePointArc((0, 1.905), (-0.3719743879, 2.8030256121), (-1.27, 3.175))
            Line((-1.27, 3.175), (0, 3.175))
            Line((0, 3.175), (0, 1.905))
        make_face()
    extrude(amount=F10_T68_DEPTH)

    split(bisect_by=Plane.XY, keep=Keep.BOTTOM)


with BuildPart() as f10_tool70:
    # F10_s71 → F10_t72 (new body)
    with BuildSketch(Plane.YZ.offset(9.017)):
        with BuildLine():
            ThreePointArc((3.175, -1.27), (2.8030256121, -0.3719743879), (1.905, 0))
            Line((1.905, 0), (3.175, 0))
            Line((3.175, 0), (3.175, -1.27))
        make_face()
    extrude(amount=-F10_T72_DEPTH)

    split(bisect_by=Plane.YZ, keep=Keep.BOTTOM)


with BuildPart() as f10_tool66_1:
    add(f10_tool66.part)

    # F10_t74: intersect F10_tool70
    add(f10_tool70.part, mode=Mode.INTERSECT)


with BuildPart() as f2_6:
    add(f2_5.part)

    # F10_t64: cut F10_tool66
    add(f10_tool66_1.part, mode=Mode.SUBTRACT)


solid = Compound([f4.part, f2_6.part])
